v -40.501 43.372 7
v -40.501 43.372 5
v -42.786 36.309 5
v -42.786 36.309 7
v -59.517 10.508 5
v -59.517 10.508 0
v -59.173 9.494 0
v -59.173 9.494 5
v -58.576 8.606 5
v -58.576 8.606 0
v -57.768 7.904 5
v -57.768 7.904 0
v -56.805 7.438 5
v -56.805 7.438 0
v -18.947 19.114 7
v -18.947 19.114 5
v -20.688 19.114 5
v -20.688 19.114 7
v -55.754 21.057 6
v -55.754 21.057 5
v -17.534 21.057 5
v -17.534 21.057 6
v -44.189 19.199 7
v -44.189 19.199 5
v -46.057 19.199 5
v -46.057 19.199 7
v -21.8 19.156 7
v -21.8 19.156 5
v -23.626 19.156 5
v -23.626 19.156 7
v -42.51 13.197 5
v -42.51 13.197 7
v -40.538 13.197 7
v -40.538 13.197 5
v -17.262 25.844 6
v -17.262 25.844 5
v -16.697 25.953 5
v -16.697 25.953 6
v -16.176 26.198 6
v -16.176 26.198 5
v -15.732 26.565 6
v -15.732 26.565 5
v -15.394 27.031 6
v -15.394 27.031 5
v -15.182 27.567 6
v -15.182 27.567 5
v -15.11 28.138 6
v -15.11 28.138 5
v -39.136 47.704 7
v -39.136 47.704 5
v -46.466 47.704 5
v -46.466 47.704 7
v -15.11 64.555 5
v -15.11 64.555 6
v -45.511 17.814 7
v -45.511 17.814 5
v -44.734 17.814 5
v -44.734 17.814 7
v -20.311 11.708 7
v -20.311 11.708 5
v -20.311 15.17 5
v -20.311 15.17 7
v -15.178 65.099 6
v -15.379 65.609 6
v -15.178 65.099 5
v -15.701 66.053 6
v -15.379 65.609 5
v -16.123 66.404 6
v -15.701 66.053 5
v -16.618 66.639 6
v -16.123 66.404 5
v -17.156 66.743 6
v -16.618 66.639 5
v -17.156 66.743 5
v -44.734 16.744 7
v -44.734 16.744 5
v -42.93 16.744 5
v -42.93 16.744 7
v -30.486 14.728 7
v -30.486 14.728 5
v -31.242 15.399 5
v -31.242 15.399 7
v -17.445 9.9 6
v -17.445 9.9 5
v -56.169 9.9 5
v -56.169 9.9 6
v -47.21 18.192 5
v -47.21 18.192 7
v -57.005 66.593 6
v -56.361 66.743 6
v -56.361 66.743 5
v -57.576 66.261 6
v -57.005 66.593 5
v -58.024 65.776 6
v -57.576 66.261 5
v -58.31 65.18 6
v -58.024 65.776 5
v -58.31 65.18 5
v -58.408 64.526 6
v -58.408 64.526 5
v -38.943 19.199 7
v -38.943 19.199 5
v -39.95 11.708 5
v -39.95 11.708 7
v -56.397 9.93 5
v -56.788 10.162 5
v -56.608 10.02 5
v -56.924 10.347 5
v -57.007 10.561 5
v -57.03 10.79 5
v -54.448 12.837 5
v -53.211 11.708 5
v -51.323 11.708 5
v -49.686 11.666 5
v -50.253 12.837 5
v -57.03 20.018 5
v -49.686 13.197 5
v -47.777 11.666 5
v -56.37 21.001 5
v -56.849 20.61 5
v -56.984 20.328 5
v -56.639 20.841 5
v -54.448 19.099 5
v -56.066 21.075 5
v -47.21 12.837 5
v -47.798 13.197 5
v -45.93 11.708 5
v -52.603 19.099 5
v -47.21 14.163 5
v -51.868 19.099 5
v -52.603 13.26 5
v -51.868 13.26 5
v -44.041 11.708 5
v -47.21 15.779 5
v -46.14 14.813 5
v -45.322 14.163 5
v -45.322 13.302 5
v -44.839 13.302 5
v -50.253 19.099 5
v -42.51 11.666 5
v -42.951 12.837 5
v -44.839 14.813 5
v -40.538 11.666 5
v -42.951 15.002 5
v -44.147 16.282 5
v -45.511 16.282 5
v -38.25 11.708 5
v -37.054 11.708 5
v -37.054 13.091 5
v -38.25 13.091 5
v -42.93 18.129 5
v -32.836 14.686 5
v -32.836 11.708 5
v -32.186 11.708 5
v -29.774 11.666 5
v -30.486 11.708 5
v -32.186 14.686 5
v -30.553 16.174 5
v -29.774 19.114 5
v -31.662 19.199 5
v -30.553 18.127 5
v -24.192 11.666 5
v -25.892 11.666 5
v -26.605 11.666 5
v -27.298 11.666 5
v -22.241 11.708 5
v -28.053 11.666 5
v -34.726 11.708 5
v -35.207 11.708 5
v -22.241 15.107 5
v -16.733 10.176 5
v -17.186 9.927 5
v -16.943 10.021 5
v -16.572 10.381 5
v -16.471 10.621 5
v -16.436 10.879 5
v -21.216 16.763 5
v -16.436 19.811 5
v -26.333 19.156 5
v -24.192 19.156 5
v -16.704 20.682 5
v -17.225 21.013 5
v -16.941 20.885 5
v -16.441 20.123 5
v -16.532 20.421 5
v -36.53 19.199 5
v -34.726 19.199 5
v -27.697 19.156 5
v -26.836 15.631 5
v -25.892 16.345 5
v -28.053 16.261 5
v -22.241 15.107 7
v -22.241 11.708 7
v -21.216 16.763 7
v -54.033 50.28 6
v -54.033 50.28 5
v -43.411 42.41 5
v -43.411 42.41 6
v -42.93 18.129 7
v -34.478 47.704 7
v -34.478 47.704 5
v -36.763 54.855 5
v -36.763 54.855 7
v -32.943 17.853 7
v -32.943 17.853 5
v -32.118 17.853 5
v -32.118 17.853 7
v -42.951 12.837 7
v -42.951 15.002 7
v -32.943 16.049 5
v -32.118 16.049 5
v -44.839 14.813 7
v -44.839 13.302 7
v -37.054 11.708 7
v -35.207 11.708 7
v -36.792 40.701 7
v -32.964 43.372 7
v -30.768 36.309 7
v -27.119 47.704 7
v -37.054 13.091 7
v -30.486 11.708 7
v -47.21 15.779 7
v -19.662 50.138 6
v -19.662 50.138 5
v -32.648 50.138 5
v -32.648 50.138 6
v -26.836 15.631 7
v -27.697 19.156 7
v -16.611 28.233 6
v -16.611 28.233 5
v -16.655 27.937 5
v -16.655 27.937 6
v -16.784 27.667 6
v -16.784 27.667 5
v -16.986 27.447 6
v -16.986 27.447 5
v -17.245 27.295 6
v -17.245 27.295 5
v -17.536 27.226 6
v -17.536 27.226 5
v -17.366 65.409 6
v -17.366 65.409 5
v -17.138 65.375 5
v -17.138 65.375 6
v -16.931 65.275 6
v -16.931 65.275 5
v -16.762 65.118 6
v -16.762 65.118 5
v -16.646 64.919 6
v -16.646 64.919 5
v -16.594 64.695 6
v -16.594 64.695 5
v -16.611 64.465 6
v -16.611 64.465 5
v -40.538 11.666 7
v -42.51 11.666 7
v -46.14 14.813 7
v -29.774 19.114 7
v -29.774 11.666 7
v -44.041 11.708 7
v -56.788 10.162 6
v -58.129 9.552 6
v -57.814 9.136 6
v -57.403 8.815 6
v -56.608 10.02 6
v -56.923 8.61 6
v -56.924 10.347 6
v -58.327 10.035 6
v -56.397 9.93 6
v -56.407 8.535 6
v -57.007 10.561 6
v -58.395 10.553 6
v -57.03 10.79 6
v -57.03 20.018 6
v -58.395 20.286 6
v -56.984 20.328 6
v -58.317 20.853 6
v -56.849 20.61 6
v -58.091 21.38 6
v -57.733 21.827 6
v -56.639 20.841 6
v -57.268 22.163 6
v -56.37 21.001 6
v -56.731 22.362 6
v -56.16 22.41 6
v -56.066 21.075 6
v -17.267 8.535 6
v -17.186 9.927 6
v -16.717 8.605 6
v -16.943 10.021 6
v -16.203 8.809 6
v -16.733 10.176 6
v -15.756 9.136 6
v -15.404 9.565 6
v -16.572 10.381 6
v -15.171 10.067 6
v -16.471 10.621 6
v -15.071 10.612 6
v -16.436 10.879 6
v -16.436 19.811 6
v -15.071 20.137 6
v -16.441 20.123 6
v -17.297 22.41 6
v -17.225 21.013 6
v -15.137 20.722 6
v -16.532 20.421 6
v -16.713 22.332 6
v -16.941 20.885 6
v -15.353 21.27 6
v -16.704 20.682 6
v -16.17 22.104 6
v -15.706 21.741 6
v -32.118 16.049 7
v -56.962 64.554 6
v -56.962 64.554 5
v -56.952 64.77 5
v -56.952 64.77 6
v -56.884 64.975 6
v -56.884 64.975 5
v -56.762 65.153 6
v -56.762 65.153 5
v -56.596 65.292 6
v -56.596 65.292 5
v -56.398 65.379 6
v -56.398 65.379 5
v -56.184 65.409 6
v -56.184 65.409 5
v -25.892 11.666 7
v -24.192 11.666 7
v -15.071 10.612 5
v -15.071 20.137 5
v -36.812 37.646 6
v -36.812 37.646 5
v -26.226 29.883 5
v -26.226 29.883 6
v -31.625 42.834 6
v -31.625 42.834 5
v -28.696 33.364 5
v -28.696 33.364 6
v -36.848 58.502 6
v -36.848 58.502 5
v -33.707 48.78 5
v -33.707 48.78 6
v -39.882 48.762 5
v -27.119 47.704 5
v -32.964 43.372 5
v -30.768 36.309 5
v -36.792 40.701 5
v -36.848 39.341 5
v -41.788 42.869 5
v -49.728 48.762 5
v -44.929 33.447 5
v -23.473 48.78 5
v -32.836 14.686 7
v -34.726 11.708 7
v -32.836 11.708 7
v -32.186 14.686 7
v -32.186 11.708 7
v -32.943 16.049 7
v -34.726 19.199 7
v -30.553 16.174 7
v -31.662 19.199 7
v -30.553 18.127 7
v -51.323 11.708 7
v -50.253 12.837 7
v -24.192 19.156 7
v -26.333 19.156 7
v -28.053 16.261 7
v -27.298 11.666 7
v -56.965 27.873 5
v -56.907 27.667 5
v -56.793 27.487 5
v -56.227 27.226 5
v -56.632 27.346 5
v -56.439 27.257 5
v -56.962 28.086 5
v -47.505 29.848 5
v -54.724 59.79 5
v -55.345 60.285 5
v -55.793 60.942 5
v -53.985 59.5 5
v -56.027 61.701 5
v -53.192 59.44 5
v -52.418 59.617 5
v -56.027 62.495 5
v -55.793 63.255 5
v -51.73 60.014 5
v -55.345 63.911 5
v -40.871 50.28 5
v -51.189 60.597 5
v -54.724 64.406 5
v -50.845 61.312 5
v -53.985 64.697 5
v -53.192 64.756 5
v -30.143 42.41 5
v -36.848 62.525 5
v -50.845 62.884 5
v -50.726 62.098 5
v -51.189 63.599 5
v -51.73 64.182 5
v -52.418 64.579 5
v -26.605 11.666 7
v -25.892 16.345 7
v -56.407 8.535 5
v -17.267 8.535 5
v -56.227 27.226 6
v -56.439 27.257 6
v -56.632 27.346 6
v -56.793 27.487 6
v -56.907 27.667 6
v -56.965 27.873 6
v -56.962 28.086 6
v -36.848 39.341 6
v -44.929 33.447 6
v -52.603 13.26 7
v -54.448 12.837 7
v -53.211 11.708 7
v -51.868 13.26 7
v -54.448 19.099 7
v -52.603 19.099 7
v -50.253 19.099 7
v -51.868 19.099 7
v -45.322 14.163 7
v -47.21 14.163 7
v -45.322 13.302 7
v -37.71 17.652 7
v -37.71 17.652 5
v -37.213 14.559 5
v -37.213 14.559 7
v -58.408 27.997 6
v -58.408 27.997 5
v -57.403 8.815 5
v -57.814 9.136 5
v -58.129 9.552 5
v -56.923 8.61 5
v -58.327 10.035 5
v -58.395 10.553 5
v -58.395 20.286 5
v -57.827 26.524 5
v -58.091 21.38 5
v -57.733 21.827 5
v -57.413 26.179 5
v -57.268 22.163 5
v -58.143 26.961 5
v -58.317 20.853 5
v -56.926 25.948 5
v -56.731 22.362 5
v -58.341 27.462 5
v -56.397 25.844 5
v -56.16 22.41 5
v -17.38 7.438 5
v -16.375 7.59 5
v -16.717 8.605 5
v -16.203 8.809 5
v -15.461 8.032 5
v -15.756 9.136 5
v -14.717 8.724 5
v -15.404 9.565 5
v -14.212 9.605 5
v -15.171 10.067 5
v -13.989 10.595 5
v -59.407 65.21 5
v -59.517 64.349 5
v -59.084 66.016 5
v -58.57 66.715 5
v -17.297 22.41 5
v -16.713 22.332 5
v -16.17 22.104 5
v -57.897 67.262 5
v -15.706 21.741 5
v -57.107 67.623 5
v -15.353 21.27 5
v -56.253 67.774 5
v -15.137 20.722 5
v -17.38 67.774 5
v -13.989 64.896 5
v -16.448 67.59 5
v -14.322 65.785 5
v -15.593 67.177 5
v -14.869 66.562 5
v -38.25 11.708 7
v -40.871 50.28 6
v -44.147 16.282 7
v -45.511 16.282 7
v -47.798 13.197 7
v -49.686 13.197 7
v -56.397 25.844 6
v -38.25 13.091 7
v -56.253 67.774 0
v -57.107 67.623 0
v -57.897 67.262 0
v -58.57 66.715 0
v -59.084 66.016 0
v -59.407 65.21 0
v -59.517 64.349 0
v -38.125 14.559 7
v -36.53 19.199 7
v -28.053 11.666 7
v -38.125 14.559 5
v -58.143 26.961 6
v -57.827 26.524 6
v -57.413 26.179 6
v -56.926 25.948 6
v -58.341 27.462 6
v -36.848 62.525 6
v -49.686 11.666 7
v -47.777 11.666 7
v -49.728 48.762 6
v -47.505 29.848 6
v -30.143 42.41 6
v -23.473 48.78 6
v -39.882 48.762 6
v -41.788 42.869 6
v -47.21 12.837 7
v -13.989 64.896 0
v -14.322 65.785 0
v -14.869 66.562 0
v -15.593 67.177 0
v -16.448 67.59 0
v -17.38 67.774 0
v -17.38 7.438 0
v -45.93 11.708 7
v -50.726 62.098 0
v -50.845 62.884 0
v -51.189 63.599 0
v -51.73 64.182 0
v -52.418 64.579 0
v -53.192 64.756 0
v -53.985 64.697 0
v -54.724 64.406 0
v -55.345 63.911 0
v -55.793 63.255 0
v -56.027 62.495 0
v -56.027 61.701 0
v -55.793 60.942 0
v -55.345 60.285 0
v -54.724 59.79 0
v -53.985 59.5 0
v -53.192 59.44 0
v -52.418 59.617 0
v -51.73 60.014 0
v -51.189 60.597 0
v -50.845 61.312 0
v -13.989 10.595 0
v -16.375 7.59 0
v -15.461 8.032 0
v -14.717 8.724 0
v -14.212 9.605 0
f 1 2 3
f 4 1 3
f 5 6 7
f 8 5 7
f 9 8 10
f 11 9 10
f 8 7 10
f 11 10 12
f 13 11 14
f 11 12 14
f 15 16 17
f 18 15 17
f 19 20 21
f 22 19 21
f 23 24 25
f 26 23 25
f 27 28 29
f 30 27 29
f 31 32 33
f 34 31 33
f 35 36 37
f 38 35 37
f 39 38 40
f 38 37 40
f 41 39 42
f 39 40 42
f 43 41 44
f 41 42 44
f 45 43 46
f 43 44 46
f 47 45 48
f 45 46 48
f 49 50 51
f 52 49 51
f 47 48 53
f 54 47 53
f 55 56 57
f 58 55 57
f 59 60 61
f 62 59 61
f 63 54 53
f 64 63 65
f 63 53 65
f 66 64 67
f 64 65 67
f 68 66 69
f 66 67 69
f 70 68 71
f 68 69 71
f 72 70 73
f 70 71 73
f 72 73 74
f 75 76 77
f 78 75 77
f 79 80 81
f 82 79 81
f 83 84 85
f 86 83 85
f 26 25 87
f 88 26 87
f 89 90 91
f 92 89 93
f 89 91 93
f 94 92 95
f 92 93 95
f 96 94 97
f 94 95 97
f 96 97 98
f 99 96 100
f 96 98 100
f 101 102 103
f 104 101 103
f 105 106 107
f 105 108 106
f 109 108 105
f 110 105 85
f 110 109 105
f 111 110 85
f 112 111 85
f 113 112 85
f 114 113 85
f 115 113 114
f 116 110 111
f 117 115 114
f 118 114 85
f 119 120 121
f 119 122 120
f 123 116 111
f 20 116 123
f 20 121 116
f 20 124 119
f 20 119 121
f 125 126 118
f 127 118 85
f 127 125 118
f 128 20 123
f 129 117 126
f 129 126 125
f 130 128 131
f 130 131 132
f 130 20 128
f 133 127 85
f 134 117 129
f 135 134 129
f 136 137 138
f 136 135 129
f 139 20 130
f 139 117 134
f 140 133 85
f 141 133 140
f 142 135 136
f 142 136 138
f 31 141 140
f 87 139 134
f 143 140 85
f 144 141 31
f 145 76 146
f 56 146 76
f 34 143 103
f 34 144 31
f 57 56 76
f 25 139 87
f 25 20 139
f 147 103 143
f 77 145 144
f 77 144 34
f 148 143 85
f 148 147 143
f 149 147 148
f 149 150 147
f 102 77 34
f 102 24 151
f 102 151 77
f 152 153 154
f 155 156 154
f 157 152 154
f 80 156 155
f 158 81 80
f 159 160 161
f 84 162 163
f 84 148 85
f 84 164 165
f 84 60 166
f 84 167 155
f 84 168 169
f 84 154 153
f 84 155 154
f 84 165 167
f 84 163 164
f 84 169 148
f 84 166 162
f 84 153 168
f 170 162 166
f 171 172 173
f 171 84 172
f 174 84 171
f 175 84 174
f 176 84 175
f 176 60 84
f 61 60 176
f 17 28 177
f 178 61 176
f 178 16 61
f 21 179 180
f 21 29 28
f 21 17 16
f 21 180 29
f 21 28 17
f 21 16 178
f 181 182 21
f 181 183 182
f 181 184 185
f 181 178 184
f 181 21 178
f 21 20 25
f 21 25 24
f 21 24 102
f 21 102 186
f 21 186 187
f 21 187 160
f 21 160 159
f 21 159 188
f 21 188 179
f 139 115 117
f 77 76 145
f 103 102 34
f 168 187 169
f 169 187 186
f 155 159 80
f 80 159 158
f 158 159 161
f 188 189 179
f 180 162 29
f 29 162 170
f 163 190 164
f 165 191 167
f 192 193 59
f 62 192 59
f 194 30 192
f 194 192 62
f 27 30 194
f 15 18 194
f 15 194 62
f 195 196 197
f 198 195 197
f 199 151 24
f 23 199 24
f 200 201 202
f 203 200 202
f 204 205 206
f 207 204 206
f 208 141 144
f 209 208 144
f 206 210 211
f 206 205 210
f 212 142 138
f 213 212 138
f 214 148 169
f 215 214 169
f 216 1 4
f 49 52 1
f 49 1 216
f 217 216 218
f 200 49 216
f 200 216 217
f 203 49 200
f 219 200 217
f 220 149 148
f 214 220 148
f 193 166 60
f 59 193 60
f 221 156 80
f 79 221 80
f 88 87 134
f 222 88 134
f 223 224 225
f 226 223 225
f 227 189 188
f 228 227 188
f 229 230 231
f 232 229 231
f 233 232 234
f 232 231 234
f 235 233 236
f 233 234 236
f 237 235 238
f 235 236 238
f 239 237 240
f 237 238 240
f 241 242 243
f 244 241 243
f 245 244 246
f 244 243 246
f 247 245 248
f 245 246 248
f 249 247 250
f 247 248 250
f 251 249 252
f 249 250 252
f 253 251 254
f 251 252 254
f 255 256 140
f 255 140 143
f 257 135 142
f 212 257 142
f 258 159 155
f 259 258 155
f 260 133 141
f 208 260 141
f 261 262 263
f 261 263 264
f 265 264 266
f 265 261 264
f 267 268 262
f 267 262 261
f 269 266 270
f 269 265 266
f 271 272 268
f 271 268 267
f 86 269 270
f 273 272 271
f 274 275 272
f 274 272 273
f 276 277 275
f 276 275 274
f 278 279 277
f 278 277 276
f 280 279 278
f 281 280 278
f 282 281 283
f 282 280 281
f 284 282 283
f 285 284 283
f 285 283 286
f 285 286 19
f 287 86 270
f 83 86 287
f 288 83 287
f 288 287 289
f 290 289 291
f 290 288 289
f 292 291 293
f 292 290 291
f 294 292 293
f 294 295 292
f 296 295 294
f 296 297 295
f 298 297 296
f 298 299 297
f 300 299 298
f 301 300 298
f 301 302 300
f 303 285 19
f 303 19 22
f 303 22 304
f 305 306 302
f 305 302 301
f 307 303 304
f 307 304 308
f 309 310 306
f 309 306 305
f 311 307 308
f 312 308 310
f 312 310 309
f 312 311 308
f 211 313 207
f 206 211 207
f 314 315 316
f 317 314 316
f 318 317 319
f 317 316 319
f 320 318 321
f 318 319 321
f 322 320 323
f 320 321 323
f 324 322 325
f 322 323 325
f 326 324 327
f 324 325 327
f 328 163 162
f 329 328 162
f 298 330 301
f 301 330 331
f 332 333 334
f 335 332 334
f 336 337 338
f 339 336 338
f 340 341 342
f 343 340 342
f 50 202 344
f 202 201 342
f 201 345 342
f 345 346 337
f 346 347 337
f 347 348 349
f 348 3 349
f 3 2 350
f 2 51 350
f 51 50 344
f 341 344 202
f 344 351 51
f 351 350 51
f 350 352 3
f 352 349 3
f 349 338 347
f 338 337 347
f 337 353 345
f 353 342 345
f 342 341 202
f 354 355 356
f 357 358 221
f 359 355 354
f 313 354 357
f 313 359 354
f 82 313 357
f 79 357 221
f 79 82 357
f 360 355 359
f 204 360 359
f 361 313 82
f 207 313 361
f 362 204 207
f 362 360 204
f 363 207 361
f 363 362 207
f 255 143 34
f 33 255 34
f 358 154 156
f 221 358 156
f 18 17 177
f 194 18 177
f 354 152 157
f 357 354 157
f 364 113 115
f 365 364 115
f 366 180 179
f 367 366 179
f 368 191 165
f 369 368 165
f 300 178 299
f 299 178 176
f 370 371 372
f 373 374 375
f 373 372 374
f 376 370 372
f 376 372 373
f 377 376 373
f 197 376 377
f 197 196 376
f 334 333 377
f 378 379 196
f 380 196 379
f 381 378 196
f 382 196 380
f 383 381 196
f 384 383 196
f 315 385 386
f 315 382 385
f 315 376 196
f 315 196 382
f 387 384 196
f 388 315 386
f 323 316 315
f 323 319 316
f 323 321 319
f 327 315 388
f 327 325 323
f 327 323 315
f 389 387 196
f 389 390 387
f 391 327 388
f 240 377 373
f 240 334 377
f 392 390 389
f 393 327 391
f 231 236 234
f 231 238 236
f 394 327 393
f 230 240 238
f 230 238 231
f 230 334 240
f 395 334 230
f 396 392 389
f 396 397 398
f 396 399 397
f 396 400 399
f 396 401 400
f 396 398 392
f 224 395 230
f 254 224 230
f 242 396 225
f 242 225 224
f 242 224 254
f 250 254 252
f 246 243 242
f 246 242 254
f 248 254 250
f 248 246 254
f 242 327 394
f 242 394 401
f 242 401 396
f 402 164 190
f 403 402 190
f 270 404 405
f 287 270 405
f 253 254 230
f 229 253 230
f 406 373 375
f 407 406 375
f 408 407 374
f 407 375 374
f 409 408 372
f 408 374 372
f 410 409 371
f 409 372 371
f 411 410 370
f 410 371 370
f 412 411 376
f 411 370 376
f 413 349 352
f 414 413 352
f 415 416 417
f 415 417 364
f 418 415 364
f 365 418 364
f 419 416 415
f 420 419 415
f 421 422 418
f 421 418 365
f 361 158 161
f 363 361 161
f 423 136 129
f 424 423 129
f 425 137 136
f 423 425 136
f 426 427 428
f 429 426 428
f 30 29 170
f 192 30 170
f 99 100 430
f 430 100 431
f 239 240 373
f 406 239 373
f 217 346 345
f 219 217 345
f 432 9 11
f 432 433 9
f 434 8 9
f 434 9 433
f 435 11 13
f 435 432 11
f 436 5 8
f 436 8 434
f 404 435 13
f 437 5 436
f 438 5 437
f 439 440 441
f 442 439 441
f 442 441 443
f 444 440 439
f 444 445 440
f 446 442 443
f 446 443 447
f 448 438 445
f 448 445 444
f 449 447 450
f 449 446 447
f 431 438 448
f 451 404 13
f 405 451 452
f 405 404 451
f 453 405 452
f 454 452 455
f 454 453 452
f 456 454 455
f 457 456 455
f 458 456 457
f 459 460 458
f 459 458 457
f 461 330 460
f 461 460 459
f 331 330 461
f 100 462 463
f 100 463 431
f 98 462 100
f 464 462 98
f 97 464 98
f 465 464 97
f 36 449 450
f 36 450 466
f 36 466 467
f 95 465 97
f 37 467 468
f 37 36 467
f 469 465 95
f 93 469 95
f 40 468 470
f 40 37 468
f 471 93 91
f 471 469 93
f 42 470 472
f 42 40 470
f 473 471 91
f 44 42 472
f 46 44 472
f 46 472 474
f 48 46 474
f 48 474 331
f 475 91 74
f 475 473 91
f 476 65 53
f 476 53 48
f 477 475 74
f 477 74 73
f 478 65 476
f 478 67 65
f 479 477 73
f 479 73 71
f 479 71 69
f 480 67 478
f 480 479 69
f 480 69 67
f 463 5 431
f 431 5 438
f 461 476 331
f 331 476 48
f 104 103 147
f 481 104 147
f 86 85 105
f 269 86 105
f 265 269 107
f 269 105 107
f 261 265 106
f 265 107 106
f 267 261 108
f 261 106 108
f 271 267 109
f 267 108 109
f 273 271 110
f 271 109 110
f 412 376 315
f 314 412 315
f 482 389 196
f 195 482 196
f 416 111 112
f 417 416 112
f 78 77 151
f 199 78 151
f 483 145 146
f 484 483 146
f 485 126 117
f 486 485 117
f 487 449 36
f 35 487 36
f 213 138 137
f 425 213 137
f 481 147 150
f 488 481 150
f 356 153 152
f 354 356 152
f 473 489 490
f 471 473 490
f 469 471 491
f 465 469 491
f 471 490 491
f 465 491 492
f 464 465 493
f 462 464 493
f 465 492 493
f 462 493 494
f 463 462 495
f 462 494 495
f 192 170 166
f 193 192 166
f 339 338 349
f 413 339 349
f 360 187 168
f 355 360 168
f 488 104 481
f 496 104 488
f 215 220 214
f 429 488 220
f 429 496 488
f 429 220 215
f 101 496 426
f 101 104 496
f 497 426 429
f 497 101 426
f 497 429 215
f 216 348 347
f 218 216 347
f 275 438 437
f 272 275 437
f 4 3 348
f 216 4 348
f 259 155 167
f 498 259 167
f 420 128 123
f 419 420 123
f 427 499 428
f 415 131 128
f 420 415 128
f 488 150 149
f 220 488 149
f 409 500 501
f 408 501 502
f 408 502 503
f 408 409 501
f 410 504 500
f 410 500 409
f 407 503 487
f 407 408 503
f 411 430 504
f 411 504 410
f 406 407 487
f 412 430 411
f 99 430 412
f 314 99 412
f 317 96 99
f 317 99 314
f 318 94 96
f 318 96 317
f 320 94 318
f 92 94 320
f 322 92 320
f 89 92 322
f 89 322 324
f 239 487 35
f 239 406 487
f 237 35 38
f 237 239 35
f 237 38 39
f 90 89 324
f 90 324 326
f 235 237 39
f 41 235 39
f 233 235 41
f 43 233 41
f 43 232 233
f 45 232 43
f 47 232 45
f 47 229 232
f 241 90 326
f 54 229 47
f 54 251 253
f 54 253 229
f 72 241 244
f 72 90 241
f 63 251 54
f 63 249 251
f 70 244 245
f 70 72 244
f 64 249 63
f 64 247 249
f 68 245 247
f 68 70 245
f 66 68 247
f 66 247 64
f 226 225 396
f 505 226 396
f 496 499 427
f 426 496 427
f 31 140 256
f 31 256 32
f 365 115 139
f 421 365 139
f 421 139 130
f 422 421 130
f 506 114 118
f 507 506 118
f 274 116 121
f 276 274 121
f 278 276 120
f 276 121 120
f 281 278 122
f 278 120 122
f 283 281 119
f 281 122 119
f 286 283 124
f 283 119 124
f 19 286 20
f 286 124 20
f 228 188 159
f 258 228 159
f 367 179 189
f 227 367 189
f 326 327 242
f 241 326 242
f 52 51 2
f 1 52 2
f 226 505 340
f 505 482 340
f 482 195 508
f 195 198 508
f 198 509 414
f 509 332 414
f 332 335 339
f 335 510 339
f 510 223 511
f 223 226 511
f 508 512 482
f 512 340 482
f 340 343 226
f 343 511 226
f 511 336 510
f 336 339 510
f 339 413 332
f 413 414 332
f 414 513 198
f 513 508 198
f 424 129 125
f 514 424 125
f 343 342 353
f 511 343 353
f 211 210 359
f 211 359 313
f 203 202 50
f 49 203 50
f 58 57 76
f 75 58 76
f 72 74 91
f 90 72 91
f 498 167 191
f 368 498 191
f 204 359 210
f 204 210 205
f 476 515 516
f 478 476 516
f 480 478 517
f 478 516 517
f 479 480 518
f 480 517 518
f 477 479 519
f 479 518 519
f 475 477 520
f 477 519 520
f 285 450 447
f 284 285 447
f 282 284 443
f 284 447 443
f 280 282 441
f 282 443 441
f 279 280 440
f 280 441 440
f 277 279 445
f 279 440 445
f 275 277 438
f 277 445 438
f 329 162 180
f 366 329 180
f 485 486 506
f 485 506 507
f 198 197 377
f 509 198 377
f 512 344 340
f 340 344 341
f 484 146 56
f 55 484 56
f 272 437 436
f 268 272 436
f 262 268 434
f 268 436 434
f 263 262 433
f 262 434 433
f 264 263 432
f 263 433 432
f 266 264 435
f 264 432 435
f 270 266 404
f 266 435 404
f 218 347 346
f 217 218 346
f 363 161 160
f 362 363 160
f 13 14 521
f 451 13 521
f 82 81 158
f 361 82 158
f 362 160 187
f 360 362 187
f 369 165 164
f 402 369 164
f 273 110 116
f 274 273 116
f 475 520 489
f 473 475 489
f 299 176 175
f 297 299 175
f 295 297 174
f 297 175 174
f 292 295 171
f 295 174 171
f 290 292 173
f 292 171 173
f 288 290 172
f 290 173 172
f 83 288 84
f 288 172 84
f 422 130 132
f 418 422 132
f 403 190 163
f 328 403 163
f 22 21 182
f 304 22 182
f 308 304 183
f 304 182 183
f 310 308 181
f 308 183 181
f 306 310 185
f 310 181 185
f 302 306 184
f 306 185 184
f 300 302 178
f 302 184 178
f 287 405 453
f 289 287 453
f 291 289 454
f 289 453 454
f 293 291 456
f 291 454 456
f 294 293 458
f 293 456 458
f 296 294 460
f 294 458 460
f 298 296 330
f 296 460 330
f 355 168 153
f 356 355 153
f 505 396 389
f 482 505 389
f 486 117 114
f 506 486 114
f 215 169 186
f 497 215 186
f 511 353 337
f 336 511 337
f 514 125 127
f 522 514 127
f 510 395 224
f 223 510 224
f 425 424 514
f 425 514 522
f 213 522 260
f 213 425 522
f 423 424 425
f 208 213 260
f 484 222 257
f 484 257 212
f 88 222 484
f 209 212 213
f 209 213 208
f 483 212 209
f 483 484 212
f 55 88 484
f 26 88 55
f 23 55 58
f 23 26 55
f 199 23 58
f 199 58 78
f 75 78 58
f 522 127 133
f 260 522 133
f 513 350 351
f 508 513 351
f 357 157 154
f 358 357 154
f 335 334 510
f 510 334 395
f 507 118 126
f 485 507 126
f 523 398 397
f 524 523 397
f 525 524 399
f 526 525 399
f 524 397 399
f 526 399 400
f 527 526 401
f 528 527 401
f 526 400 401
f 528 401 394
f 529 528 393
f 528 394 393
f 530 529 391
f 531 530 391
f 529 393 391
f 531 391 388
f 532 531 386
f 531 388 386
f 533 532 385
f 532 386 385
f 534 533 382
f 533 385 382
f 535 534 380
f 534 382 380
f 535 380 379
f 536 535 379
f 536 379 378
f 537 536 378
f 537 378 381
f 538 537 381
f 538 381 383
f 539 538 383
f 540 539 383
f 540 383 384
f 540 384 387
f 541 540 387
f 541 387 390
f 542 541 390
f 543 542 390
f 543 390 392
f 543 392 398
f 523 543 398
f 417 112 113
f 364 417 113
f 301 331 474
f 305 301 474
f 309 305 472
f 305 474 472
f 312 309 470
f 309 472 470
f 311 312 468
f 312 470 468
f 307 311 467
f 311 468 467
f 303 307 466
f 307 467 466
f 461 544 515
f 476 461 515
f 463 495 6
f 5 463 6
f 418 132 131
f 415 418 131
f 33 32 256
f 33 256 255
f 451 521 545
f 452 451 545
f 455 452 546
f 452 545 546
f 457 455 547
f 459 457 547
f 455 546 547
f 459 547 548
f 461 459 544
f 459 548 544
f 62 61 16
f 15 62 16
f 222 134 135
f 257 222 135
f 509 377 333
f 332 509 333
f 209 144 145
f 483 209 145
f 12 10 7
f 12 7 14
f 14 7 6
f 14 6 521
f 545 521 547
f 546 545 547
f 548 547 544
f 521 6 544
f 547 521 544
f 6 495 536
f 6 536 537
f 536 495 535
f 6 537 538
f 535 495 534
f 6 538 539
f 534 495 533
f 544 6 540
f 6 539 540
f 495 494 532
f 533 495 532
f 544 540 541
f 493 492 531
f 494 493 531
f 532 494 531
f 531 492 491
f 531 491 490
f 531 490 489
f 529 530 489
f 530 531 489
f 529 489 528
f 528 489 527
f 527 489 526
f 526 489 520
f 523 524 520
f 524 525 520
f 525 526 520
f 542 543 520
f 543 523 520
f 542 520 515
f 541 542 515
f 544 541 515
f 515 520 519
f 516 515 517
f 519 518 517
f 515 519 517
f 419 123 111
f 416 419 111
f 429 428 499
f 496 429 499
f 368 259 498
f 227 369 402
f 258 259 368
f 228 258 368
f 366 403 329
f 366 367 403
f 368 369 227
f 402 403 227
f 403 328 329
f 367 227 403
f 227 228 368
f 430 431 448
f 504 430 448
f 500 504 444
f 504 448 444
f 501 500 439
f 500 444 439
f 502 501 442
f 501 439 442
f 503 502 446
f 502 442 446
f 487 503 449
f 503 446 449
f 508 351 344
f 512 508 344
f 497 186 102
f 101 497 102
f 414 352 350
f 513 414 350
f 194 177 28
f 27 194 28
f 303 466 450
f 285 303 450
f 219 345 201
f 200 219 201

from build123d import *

# Parameters (mm, degrees)
F3_DEPTH = 5
F2_W     = 1.972348
F2_H     = 1.531718
F2_W_2   = 0.824641
F2_H_2   = 1.804244
F4_DEPTH = 7
F5_DEPTH = 6
F6_R     = 2.66535
F7_DEPTH = 25


with BuildPart() as f3:
    # F0 (on Top) → F3 (new body)
    with BuildSketch(Plane.XY):
        with BuildLine():
            ThreePointArc((-56.252591, 67.774169), (-58.569985, 66.714597), (-59.516679, 64.348847))
            Line((-59.516679, 64.348847), (-59.516679, 10.507591))
            ThreePointArc((-59.516679, 10.507591), (-58.576435, 8.605541), (-56.804508, 7.438438))
            Line((-56.804508, 7.438438), (-17.379601, 7.438438))
            ThreePointArc((-17.379601, 7.438438), (-15.063115, 8.349842), (-13.988701, 10.59537))
            Line((-13.988701, 10.59537), (-13.988701, 64.895824))
            ThreePointArc((-13.988701, 64.895824), (-15.211268, 66.892462), (-17.3801, 67.774169))
            Line((-17.3801, 67.774169), (-56.252591, 67.774169))
        make_face()
    extrude(amount=F3_DEPTH)

    # F2 (on face) → F4 (join)
    with BuildSketch(Plane.XY):
        Polygon((-34.477703, 47.703966), (-36.762577, 54.855321), (-39.136469, 47.703966), (-46.465863, 47.703966), (-40.501457, 43.371614), (-42.78633, 36.309283), (-36.792252, 40.700983), (-30.768499, 36.309283), (-32.964349, 43.371614), (-27.118638, 47.703966), align=None)
        Polygon((-52.602682, 19.098559), (-54.448072, 19.098559), (-54.448072, 12.837417), (-53.211175, 11.707636), (-51.322754, 11.707636), (-50.25265, 12.837417), (-50.25265, 19.098559), (-51.868297, 19.098559), (-51.868297, 13.260337), (-52.602682, 13.260337), align=None)
        Polygon((-47.797702, 13.197389), (-49.686123, 13.197389), (-49.686123, 11.665671), (-47.776721, 11.665671), align=None)
        with Locations((-41.523952, 12.43153)):
            Rectangle(F2_W, F2_H)
        Polygon((-27.69652, 19.156404), (-29.773781, 19.11444), (-29.773781, 11.665671), (-28.05322, 11.665671), (-28.05322, 16.260827), (-27.297853, 11.665671), (-26.605431, 11.665671), (-25.89203, 16.344756), (-25.89203, 11.665671), (-24.192452, 11.665671), (-24.192452, 19.156404), (-26.33266, 19.156404), (-26.836239, 15.631353), align=None)
        Polygon((-21.800453, 19.156404), (-23.625925, 19.156404), (-22.241084, 15.106793), (-22.241084, 11.707636), (-20.310698, 11.707636), (-20.310698, 15.16974), (-18.946839, 19.11444), (-20.688383, 19.11444), (-21.216365, 16.763071), align=None)
        Polygon((-44.189095, 19.199306), (-46.056628, 19.199306), (-47.21006, 18.192066), (-47.21006, 15.778592), (-46.140123, 14.812943), (-44.838972, 14.812943), (-44.838972, 13.301941), (-45.321684, 13.301941), (-45.321684, 14.162599), (-47.21006, 14.162599), (-47.21006, 12.837417), (-45.92995, 11.707636), (-44.04144, 11.707636), (-42.950634, 12.837417), (-42.950634, 15.00163), (-44.146817, 16.282091), (-45.510922, 16.282091), (-45.510922, 17.814049), (-44.734415, 17.814049), (-44.734415, 16.743535), (-42.929973, 16.743535), (-42.929973, 18.128658), align=None)
        Polygon((-36.5301, 19.199306), (-38.943209, 19.199306), (-39.949652, 11.707636), (-38.250133, 11.707636), (-38.250133, 13.09123), (-37.053928, 13.09123), (-37.053928, 11.707636), (-35.207368, 11.707636), align=None)
        Polygon((-38.125273, 14.558707), (-37.709754, 17.651711), (-37.212875, 14.558707), align=None, mode=Mode.SUBTRACT)
        Polygon((-31.661924, 19.199306), (-34.725517, 19.199306), (-34.725517, 11.707636), (-32.836229, 11.707636), (-32.836229, 14.685798), (-32.186054, 14.685798), (-32.186054, 11.707636), (-30.48607, 11.707636), (-30.48607, 14.727519), (-31.241864, 15.399171), (-30.553139, 16.174177), (-30.553139, 18.127391), align=None)
        with Locations((-32.530801, 16.951129)):
            Rectangle(F2_W_2, F2_H_2, mode=Mode.SUBTRACT)
    extrude(amount=F4_DEPTH)

    # F1 (on face) → F5 (join)
    with BuildSketch(Plane.XY):
        with BuildLine():
            ThreePointArc((-56.361381, 66.743255), (-57.818165, 66.035044), (-58.408085, 64.526476))
            Line((-58.408085, 64.526476), (-58.408085, 27.996894))
            ThreePointArc((-58.408085, 27.996894), (-57.826971, 26.523854), (-56.396667, 25.844317))
            Line((-56.396667, 25.844317), (-17.262138, 25.844317))
            ThreePointArc((-17.262138, 25.844317), (-15.731986, 26.565248), (-15.109562, 28.138047))
            Line((-15.109562, 28.138047), (-15.109562, 64.555392))
            ThreePointArc((-15.109562, 64.555392), (-15.701004, 66.053371), (-17.156273, 66.743255))
            Line((-17.156273, 66.743255), (-56.361381, 66.743255))
        make_face()
        with BuildLine():
            ThreePointArc((-56.961637, 64.553842), (-56.761735, 65.153459), (-56.183666, 65.409072))
            Line((-56.183666, 65.409072), (-17.366143, 65.409072))
            ThreePointArc((-17.366143, 65.409072), (-16.761555, 65.118493), (-16.610773, 64.464867))
            Line((-16.610773, 64.464867), (-16.610773, 28.233234))
            ThreePointArc((-16.610773, 28.233234), (-16.877061, 27.549546), (-17.535625, 27.226076))
            Line((-17.535625, 27.226076), (-56.227252, 27.226076))
            ThreePointArc((-56.227252, 27.226076), (-56.792806, 27.486884), (-56.961637, 28.086357))
            Line((-56.961637, 28.086357), (-56.961637, 64.553842))
        make_face(mode=Mode.SUBTRACT)
        Polygon((-32.648411, 50.138444), (-36.847699, 62.524572), (-40.870544, 50.279595), (-54.033015, 50.279595), (-43.411288, 42.410344), (-47.504712, 29.847771), (-36.81241, 37.646446), (-26.225971, 29.883061), (-30.142954, 42.410344), (-19.66238, 50.138444), align=None)
        Polygon((-39.882477, 48.762206), (-36.847699, 58.501728), (-33.707052, 48.779701), (-23.472983, 48.779701), (-31.625055, 42.833801), (-28.696308, 33.363523), (-36.847699, 39.341208), (-44.928677, 33.447161), (-41.788034, 42.869091), (-49.727861, 48.762206), align=None, mode=Mode.SUBTRACT)
        with BuildLine():
            Line((-17.296651, 22.409985), (-56.159921, 22.409985))
            ThreePointArc((-56.159921, 22.409985), (-57.73311, 21.827224), (-58.39467, 20.285513))
            Line((-58.39467, 20.285513), (-58.39467, 10.552553))
            ThreePointArc((-58.39467, 10.552553), (-57.814134, 9.136198), (-56.406535, 8.534743))
            Line((-56.406535, 8.534743), (-17.266981, 8.534743))
            ThreePointArc((-17.266981, 8.534743), (-15.755662, 9.136305), (-15.071128, 10.611899))
            Line((-15.071128, 10.611899), (-15.071128, 20.137144))
            ThreePointArc((-15.071128, 20.137144), (-15.706151, 21.741357), (-17.296651, 22.409985))
        make_face()
        with BuildLine():
            Line((-57.029683, 10.789941), (-57.029683, 20.018449))
            ThreePointArc((-57.029683, 20.018449), (-56.638588, 20.841056), (-55.753719, 21.057026))
            Line((-55.753719, 21.057026), (-17.534047, 21.057026))
            ThreePointArc((-17.534047, 21.057026), (-16.703582, 20.68187), (-16.43612, 19.810732))
            Line((-16.43612, 19.810732), (-16.43612, 10.878962))
            ThreePointArc((-16.43612, 10.878962), (-16.733474, 10.175971), (-17.445026, 9.899732))
            Line((-17.445026, 9.899732), (-56.169149, 9.899732))
            ThreePointArc((-56.169149, 9.899732), (-56.788219, 10.162327), (-57.029683, 10.789941))
        make_face(mode=Mode.SUBTRACT)
    extrude(amount=F5_DEPTH)

    # F6 (on face) → F7 (cut)
    with BuildSketch(Plane.XY.offset(5)):
        with Locations((-53.391658, 62.098049)):
            Circle(F6_R)
    extrude(amount=-F7_DEPTH, mode=Mode.SUBTRACT)


solid = f3.part
